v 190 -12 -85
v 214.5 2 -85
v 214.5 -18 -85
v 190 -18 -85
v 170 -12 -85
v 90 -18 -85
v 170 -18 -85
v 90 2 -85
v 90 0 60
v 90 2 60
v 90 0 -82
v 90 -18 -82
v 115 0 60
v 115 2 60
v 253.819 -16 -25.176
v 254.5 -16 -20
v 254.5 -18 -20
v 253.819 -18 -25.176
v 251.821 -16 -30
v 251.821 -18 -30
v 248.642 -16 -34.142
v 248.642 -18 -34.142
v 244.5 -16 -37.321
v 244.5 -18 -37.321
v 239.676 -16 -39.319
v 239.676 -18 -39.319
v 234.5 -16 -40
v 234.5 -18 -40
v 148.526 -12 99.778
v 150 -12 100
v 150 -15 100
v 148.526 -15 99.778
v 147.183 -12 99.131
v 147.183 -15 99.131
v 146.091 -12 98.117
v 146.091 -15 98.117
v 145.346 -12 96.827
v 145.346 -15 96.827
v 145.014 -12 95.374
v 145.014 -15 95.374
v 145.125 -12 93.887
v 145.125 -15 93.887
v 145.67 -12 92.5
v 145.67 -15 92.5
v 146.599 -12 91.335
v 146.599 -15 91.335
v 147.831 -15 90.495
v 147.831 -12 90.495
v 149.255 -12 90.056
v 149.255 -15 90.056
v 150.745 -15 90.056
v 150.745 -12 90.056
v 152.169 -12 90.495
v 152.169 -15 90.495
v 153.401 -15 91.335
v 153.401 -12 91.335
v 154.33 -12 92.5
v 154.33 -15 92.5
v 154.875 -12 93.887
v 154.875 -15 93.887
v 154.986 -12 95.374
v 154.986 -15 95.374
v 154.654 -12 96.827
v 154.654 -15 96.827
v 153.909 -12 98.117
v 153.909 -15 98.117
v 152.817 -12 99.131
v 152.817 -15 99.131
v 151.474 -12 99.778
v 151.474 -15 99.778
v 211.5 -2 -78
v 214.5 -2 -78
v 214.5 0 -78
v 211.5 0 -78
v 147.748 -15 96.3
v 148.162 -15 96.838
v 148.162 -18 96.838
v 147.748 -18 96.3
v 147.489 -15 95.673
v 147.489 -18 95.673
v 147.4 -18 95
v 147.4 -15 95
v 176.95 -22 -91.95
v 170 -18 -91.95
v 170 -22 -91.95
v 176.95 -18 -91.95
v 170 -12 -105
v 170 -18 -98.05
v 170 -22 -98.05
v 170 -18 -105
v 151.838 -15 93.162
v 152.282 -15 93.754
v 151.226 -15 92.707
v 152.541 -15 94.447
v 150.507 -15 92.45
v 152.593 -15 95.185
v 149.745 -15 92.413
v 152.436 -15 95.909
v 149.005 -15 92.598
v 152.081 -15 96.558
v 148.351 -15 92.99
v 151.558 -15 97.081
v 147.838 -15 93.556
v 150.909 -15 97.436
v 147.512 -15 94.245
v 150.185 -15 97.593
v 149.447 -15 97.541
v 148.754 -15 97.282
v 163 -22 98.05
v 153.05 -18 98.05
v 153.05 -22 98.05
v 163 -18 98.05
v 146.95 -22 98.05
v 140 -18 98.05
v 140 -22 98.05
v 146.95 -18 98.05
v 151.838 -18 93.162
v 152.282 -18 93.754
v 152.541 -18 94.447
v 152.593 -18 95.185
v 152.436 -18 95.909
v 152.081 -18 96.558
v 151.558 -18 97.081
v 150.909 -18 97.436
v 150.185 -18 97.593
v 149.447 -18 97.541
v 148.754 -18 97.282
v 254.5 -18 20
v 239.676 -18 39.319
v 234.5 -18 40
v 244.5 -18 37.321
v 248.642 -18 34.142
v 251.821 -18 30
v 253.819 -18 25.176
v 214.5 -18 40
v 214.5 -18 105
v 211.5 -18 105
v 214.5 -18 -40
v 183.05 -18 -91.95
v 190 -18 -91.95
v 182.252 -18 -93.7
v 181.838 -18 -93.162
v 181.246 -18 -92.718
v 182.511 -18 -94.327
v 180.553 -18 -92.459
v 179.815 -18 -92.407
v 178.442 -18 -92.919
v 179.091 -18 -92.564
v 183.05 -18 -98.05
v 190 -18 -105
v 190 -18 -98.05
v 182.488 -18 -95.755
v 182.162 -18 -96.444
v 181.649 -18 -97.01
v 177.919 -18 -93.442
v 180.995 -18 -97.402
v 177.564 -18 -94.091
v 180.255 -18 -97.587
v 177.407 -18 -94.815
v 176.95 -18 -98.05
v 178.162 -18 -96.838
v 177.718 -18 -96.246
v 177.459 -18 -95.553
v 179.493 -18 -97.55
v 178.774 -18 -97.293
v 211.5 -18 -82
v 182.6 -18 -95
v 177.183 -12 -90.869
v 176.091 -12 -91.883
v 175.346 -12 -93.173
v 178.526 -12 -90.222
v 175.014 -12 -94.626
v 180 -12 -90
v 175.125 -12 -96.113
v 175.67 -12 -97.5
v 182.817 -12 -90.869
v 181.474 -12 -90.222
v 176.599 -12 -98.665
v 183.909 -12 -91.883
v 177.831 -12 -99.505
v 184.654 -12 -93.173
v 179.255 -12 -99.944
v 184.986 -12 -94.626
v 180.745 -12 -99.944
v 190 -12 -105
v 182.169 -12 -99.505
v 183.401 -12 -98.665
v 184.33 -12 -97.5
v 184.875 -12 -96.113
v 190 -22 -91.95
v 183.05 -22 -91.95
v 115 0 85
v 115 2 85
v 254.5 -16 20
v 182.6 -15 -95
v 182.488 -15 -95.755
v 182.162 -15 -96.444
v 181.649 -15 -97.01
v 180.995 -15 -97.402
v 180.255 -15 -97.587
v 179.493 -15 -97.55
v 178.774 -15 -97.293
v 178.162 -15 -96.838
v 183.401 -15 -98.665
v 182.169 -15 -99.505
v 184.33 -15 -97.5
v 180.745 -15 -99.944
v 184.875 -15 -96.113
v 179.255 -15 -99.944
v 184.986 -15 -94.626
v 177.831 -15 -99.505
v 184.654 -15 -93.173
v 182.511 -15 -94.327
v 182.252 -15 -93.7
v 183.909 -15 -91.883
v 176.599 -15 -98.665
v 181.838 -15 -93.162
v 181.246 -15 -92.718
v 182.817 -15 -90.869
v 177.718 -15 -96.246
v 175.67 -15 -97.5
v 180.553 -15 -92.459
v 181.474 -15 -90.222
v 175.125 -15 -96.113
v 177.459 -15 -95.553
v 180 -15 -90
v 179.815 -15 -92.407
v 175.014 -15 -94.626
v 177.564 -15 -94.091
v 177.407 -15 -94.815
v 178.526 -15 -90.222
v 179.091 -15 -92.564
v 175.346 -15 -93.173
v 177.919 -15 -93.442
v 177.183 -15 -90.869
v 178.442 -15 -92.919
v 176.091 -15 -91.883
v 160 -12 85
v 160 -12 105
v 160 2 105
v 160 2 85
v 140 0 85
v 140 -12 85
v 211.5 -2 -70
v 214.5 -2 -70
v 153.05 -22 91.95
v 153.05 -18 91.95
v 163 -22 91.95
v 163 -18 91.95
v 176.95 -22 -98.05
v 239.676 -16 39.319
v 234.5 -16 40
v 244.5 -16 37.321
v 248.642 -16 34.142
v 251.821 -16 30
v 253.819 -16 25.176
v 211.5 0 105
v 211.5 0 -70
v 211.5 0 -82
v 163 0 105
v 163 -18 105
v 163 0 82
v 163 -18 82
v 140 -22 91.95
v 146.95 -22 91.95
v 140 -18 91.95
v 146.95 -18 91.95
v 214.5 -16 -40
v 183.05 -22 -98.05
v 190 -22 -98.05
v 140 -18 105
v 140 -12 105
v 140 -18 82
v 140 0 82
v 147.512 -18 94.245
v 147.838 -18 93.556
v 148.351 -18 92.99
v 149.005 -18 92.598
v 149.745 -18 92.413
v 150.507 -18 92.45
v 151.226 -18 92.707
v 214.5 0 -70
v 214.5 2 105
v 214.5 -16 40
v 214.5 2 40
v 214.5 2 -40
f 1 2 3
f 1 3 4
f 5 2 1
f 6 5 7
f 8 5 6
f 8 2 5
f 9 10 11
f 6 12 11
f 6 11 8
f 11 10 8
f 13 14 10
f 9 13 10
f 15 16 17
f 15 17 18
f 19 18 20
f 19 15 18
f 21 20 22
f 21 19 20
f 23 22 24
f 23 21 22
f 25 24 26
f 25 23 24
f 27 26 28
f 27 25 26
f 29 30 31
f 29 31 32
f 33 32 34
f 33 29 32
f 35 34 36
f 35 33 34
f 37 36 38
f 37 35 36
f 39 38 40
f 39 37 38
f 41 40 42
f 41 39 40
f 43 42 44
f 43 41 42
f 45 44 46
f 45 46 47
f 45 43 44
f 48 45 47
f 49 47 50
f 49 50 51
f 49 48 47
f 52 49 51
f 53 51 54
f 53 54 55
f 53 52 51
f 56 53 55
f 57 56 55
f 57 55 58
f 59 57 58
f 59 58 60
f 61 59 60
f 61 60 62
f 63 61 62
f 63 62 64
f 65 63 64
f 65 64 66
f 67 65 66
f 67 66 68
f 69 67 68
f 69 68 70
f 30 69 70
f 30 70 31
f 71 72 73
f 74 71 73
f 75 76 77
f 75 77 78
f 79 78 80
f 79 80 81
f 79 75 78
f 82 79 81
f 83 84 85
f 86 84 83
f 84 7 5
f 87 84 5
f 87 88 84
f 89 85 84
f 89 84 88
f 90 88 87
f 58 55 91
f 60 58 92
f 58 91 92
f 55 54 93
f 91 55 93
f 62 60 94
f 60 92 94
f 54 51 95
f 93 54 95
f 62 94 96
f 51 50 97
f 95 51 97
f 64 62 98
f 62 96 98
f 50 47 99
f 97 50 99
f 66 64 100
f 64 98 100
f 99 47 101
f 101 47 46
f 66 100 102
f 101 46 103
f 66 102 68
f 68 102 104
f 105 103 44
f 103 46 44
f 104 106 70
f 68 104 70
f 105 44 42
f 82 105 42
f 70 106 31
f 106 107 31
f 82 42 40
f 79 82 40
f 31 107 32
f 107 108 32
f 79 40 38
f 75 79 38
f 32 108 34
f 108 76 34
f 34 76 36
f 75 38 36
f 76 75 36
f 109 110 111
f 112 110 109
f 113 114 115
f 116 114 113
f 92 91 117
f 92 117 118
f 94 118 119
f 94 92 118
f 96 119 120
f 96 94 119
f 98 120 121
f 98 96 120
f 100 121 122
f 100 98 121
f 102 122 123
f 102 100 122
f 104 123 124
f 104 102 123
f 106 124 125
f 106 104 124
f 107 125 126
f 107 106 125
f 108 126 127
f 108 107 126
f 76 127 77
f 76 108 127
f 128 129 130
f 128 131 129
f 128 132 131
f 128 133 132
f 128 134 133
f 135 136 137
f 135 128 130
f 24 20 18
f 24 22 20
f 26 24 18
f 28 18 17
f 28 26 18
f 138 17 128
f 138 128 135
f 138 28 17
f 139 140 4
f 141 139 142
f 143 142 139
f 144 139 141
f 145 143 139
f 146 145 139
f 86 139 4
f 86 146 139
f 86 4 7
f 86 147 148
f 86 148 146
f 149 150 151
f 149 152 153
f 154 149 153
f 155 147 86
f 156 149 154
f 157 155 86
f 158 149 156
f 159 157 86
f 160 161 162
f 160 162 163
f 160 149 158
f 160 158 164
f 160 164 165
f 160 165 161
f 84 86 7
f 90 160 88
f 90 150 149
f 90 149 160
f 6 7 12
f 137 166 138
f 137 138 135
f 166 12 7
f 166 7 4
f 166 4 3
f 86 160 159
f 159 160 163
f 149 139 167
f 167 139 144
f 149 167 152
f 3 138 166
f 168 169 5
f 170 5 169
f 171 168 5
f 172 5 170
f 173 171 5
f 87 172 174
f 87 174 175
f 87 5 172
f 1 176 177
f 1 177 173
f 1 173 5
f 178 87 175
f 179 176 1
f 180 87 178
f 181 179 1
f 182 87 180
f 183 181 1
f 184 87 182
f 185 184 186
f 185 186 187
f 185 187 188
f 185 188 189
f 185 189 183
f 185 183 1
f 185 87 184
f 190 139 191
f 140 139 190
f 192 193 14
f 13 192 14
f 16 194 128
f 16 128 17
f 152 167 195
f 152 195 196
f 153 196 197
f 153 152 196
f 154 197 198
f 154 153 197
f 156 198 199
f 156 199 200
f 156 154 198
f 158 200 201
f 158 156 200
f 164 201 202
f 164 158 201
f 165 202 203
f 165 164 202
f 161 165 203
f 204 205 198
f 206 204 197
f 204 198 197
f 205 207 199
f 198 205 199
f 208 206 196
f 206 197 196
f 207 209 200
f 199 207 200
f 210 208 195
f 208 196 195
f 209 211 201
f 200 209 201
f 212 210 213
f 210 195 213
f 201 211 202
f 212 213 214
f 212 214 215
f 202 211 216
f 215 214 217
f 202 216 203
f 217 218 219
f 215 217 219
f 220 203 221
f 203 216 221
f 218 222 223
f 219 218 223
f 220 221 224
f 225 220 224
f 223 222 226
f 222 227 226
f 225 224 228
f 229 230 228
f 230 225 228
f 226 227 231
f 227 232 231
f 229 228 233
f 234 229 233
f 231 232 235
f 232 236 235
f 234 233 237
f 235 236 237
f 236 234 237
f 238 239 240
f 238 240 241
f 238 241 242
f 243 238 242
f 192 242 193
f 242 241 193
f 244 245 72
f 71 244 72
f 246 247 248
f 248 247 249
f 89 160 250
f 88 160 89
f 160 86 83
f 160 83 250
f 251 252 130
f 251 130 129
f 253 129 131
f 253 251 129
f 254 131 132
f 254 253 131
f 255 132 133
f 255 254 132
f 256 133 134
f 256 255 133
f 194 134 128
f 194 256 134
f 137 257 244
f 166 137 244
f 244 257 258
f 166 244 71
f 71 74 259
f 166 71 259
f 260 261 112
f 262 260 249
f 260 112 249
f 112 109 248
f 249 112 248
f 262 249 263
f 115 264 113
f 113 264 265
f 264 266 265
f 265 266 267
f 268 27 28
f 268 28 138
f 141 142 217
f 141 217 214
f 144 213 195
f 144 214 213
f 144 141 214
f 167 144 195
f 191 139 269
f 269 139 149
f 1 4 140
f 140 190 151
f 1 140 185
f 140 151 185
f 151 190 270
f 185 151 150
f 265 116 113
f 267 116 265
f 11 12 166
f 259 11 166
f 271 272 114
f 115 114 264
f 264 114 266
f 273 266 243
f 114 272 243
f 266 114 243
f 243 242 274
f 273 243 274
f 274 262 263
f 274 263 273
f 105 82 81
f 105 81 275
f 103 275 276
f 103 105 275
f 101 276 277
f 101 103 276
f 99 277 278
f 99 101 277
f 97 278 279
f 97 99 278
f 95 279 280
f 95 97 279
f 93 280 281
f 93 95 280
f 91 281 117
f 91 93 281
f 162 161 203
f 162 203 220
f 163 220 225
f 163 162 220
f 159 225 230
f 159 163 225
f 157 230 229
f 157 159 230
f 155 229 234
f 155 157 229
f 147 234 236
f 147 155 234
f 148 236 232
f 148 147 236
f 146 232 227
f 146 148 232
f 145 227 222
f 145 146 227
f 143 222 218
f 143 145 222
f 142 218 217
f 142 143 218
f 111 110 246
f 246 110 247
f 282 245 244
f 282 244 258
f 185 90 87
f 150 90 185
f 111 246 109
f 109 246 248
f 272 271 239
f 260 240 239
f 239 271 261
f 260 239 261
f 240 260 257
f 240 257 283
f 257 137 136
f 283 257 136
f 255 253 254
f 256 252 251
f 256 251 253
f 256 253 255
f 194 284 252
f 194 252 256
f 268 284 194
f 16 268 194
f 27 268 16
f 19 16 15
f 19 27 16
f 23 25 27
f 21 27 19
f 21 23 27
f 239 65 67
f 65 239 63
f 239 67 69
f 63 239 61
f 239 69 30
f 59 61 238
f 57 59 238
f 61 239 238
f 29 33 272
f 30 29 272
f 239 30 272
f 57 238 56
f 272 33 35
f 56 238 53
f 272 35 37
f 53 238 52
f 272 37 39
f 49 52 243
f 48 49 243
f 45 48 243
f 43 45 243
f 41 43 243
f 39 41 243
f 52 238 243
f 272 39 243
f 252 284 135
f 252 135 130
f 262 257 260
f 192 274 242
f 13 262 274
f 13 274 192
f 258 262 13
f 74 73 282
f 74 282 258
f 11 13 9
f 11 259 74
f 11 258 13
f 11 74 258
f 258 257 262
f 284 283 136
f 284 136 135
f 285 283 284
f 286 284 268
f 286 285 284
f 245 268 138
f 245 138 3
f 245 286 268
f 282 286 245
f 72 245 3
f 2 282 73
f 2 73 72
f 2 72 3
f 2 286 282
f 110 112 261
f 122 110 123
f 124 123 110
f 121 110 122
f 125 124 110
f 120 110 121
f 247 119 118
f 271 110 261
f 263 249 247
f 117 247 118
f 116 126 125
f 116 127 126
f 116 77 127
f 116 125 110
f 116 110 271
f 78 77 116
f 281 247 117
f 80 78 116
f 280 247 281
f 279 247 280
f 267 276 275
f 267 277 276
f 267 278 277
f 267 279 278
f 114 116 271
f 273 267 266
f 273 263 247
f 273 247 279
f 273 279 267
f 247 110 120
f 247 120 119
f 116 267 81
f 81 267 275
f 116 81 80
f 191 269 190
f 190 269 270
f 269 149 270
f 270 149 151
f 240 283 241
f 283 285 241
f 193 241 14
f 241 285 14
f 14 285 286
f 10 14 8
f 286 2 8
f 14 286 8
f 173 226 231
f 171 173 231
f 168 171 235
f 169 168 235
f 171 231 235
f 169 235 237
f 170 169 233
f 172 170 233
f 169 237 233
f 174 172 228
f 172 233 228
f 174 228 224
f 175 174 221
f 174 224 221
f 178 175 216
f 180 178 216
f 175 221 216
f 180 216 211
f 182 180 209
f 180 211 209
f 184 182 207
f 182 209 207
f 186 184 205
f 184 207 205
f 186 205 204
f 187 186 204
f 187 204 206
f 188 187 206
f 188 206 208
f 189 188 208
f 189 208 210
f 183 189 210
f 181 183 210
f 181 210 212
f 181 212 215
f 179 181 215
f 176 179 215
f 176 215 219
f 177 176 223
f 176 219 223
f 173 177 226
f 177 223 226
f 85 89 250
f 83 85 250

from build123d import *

# Parameters (mm, degrees)
SKETCH_1_W           = 180
SKETCH_1_H           = 170
EXTRUDE_1_DEPTH      = 2
SKETCH_2_W           = 180
SKETCH_2_H           = 2
SKETCH_2_W_2         = 2
SKETCH_2_H_2         = 166
EXTRUDE_2_DEPTH      = 18
SKETCH_4_W           = 20
SKETCH_4_H           = 20
EXTRUDE_3_DEPTH      = 20
SKETCH_5_W           = 20
SKETCH_5_H           = 20
CUT_EXTRUDE_1_DEPTH  = 14
SKETCH_6_W           = 176
SKETCH_6_H           = 166
SKETCH_6_W_2         = 174
SKETCH_6_H_2         = 164
EXTRUDE_4_DEPTH      = 18
SKETCH_7_W           = 20
SKETCH_7_H           = 20
EXTRUDE_5_DEPTH      = 6
SKETCH_8_W           = 3
SKETCH_8_H           = 164
SKETCH_8_H_2         = 3
CUT_EXTRUDE_2_DEPTH  = 18
SKETCH_9_W           = 77
SKETCH_9_H           = 3
CUT_EXTRUDE_3_DEPTH  = 18
SKETCH_10_W          = 25
SKETCH_10_H          = 25
CUT_EXTRUDE_4_DEPTH  = 18
SKETCH_11_W          = 6.95
SKETCH_11_H          = 6.1
EXTRUDE_6_DEPTH      = 4
CUT_EXTRUDE_5_DEPTH  = 6
CUT_EXTRUDE_START    = -3
SKETCH_13_R          = 5
SKETCH_13_R_2        = 2.6
CUT_EXTRUDE_6_DEPTH  = 3
CUT_EXTRUDE_7_DEPTH  = 3
SKETCH_15_R          = 2.6
CUT_EXTRUDE_8_DEPTH  = 3
SKETCH_16_W          = 6.1
SKETCH_16_H          = 6.95
EXTRUDE_7_DEPTH      = 4
CUT_EXTRUDE_9_DEPTH  = 6
SKETCH_18_R          = 5
SKETCH_18_R_2        = 2.6
CUT_EXTRUDE_10_DEPTH = 3
EXTRUDE_8_DEPTH      = 4
SKETCH_20_W          = 30
SKETCH_20_H          = 20
SKETCH_20_W_2        = 80
EXTRUDE_9_DEPTH      = 2
SKETCH_21_W          = 3
SKETCH_21_H          = 20
EXTRUDE_10_DEPTH     = 18
SKETCH_22_W          = 20
SKETCH_22_H          = 20
SKETCH_22_R          = 5
EXTRUDE_11_DEPTH     = 14
SKETCH_23_W          = 30
SKETCH_23_H          = 20
CUT_EXTRUDE_11_DEPTH = 14
SKETCH_24_W          = 20
SKETCH_24_H          = 20
EXTRUDE_12_DEPTH     = 2
SKETCH_25_W          = 20
SKETCH_25_H          = 3
CUT_EXTRUDE_12_DEPTH = 18
CUT_EXTRUDE_13_DEPTH = 18
SKETCH_27_W          = 3
SKETCH_27_H          = 20
EXTRUDE_13_DEPTH     = 20
SKETCH_28_W          = 23
SKETCH_28_H          = 3
EXTRUDE_14_DEPTH     = 20
SKETCH_29_W          = 3
SKETCH_29_H          = 5
CUT_EXTRUDE_14_DEPTH = 20
SKETCH_30_W          = 20
SKETCH_30_H          = 20
CUT_EXTRUDE_15_DEPTH = 30
SKETCH_31_W          = 3
SKETCH_31_H          = 190
EXTRUDE_15_DEPTH     = 20
EXTRUDE_START        = -2
EXTRUDE_16_DEPTH     = 2
SKETCH_33_W          = 40
SKETCH_33_H          = 80
CUT_EXTRUDE_16_DEPTH = 2
SKETCH_34_W          = 44.5
SKETCH_34_H          = 20
CUT_EXTRUDE_17_DEPTH = 30
SKETCH_35_W          = 20
SKETCH_35_H          = 3
CUT_EXTRUDE_18_DEPTH = 18
EXTRUDE_17_DEPTH     = 20
CUT_EXTRUDE_19_DEPTH = 20
SKETCH_38_R          = 5
CUT_EXTRUDE_20_DEPTH = 17
SKETCH_39_W          = 20
SKETCH_39_H          = 20
CUT_EXTRUDE_21_DEPTH = 14
SKETCH_40_W          = 54.5
SKETCH_40_H          = 20
EXTRUDE_18_DEPTH     = 2
SKETCH_42_W          = 3
SKETCH_42_H          = 23
EXTRUDE_20_DEPTH     = 18
SKETCH_44_W          = 9.95
SKETCH_44_H          = 6.1
SKETCH_44_W_2        = 6.95
EXTRUDE_21_DEPTH     = 4
SKETCH_45_W          = 26.378914519
SKETCH_45_H          = 21.149439528
CUT_EXTRUDE_22_DEPTH = 30
SKETCH_46_W          = 20
SKETCH_46_H          = 3
EXTRUDE_22_DEPTH     = 18
CUT_EXTRUDE_23_DEPTH = 30
SKETCH_48_W          = 47
SKETCH_48_H          = 3
CUT_EXTRUDE_24_DEPTH = 18
SKETCH_49_W          = 50.597895005
SKETCH_49_H          = 84.263639234
CUT_EXTRUDE_25_DEPTH = 2
SKETCH_50_W          = 48.5
SKETCH_50_H          = 3
CUT_EXTRUDE_26_DEPTH = 18
SKETCH_51_W          = 8
SKETCH_51_H          = 2
CUT_EXTRUDE_27_DEPTH = 18


with BuildPart() as part:
    # 草图1 → 凸台-拉伸1 (new body)
    with BuildSketch(Plane(origin=(0, 0, 0), x_dir=(1, 0, 0), z_dir=(0, 1, 0))):
        Rectangle(SKETCH_1_W, SKETCH_1_H)
    extrude_1 = extrude(amount=EXTRUDE_1_DEPTH)

    # 草图2 → 凸台-拉伸2 (add)
    with BuildSketch(Plane(origin=(0, 0, 0), x_dir=(1, 0, 0), z_dir=(0, 1, 0))):
        with Locations((0, 84)):
            Rectangle(SKETCH_2_W, SKETCH_2_H)
        Polygon((-88, 83), (-90, 83), (-90, -85), (-88, -85), (-88, -83), align=None)
        with Locations((89, 0)):
            Rectangle(SKETCH_2_W_2, SKETCH_2_H_2)
        Polygon((90, -85), (90, -83), (88, -83), (-88, -83), (-88, -85), align=None)
    extrude_2 = extrude(amount=-EXTRUDE_2_DEPTH)

    # 草图4 → 凸台-拉伸3 (add)
    with BuildSketch(Plane(origin=(0, 2, 0), x_dir=(1, 0, 0), z_dir=(0, 1, 0))):
        Polygon((10, -85), (0, -85), (-10, -85), (-10, -95), (-10, -105), (10, -105), (10, -95), align=None)
        with Locations((-100, 0)):
            Rectangle(SKETCH_4_W, SKETCH_4_H)
    extrude(amount=-EXTRUDE_3_DEPTH)

    # 草图5 → 切除-拉伸1 (cut)
    with BuildSketch(Plane(origin=(0, 2, 0), x_dir=(1, 0, 0), z_dir=(0, 1, 0))):
        with Locations((-100, 0)):
            Rectangle(SKETCH_5_W, SKETCH_5_H)
        with Locations((0, -95)):
            Rectangle(SKETCH_5_W, SKETCH_5_H)
    extrude(amount=-CUT_EXTRUDE_1_DEPTH, mode=Mode.SUBTRACT)

    # 草图6 → 凸台-拉伸4 (add)
    with BuildSketch(Plane.XZ):
        Rectangle(SKETCH_6_W, SKETCH_6_H)
        Rectangle(SKETCH_6_W_2, SKETCH_6_H_2, mode=Mode.SUBTRACT)
    extrude_4 = extrude(amount=EXTRUDE_4_DEPTH)

    # 草图7 → 凸台-拉伸5 (add)
    with BuildSketch(Plane(origin=(0, -18, 0), x_dir=(-1, 0, 0), z_dir=(0, -1, 0))):
        with Locations((0, 95)):
            Rectangle(SKETCH_7_W, SKETCH_7_H)
    extrude_5 = extrude(amount=-EXTRUDE_5_DEPTH)

    # 草图8 → 切除-拉伸2 (cut)
    with BuildSketch(Plane(origin=(0, -18, 0), x_dir=(-1, 0, 0), z_dir=(0, -1, 0))):
        with Locations((-88.5, 0)):
            Rectangle(SKETCH_8_W, SKETCH_8_H)
        with Locations((-88.5, -83.5)):
            Rectangle(SKETCH_8_W, SKETCH_8_H_2)
    extrude(amount=-CUT_EXTRUDE_2_DEPTH, mode=Mode.SUBTRACT)

    # 草图9 → 切除-拉伸3 (cut)
    with BuildSketch(Plane(origin=(0, -18, 0), x_dir=(-1, 0, 0), z_dir=(0, -1, 0))):
        with Locations((-48.5, -83.5)):
            Rectangle(SKETCH_9_W, SKETCH_9_H)
        with Locations((48.5, -83.5)):
            Rectangle(SKETCH_9_W, SKETCH_9_H)
    extrude(amount=-CUT_EXTRUDE_3_DEPTH, mode=Mode.SUBTRACT)

    # 草图10 → 切除-拉伸4 (cut)
    with BuildSketch(Plane(origin=(0, 2, 0), x_dir=(1, 0, 0), z_dir=(0, 1, 0))):
        with Locations((77.5, -72.5)):
            Rectangle(SKETCH_10_W, SKETCH_10_H)
    cut_extrude_4 = extrude(amount=-CUT_EXTRUDE_4_DEPTH, mode=Mode.SUBTRACT)

    # 草图11 → 凸台-拉伸6 (add)
    with BuildSketch(Plane(origin=(0, -18, 0), x_dir=(-1, 0, 0), z_dir=(0, -1, 0))):
        Polygon((-3.05, 91.95), (-3.05, 98.05), (-10, 98.05), (-10, 95), (-10, 91.95), align=None)
        with Locations((6.525, 95)):
            Rectangle(SKETCH_11_W, SKETCH_11_H)
    extrude_6 = extrude(amount=EXTRUDE_6_DEPTH)

    # 草图12 → 切除-拉伸5 (cut)
    with BuildSketch(Plane(origin=(0, -18, 0), x_dir=(-1, 0, 0), z_dir=(0, -1, 0))):
        with BuildLine():
            ThreePointArc((-1.838477631, 96.838477631), (-1.838477631, 93.161522369), (1.838477631, 93.161522369))
            Line((1.838477631, 93.161522369), (-1.838477631, 96.838477631))
        make_face()
        with BuildLine():
            Line((-1.838477631, 96.838477631), (1.838477631, 93.161522369))
            ThreePointArc((1.838477631, 93.161522369), (2.402086785, 94.005023076), (2.6, 95))
            ThreePointArc((2.6, 95), (0.994976924, 97.402086785), (-1.838477631, 96.838477631))
        make_face()
    cut_extrude_5 = extrude(amount=-CUT_EXTRUDE_5_DEPTH, mode=Mode.SUBTRACT)

    # 草图13 → 切除-拉伸6 (cut)
    with BuildSketch(Plane(origin=(0, -12, 0), x_dir=(1, 0, 0), z_dir=(0, 1, 0)).offset(CUT_EXTRUDE_START)):
        with Locations(Location((0, 95, 0), (0, 0, 270))):
            Circle(SKETCH_13_R)
        with Locations(Location((0, 95, 0), (0, 0, 90))):
            Circle(SKETCH_13_R_2, mode=Mode.SUBTRACT)
    cut_extrude_6 = extrude(amount=CUT_EXTRUDE_6_DEPTH, mode=Mode.SUBTRACT)

    # 草图14 → 切除-拉伸7 (cut)
    with BuildSketch(Plane(origin=(0, -12, 0), x_dir=(1, 0, 0), z_dir=(0, 1, 0))):
        with BuildLine():
            ThreePointArc((-96.464466094, 3.535533906), (-103.535533906, 3.535533906), (-103.535533906, -3.535533906))
            Line((-103.535533906, -3.535533906), (-96.464466094, 3.535533906))
        make_face()
        with BuildLine():
            Line((-96.464466094, 3.535533906), (-103.535533906, -3.535533906))
            ThreePointArc((-103.535533906, -3.535533906), (-98.086582838, -4.619397663), (-95, 0))
            ThreePointArc((-95, 0), (-95.380602337, 1.913417162), (-96.464466094, 3.535533906))
        make_face()
    extrude(amount=-CUT_EXTRUDE_7_DEPTH, mode=Mode.SUBTRACT)

    # 草图15 → 切除-拉伸8 (cut)
    with BuildSketch(Plane(origin=(0, -15, 0), x_dir=(1, 0, 0), z_dir=(0, 1, 0))):
        with Locations(Location((-100, 0, 0), (0, 0, 270))):
            Circle(SKETCH_15_R)
    extrude(amount=-CUT_EXTRUDE_8_DEPTH, mode=Mode.SUBTRACT)

    # 草图16 → 凸台-拉伸7 (add)
    with BuildSketch(Plane.XZ.offset(18)):
        Polygon((-96.95, -3.05), (-100, -3.05), (-103.05, -3.05), (-103.05, -10), (-96.95, -10), align=None)
        with Locations((-100, 6.525)):
            Rectangle(SKETCH_16_W, SKETCH_16_H)
    extrude(amount=EXTRUDE_7_DEPTH)

    # 草图17 → 切除-拉伸9 (cut)
    with BuildSketch(Plane(origin=(0, -18, 0), x_dir=(-1, 0, 0), z_dir=(0, -1, 0))):
        with BuildLine():
            ThreePointArc((2.6, -95), (0.994976924, -92.597913215), (-1.838477631, -93.161522369))
            Line((-1.838477631, -93.161522369), (1.838477631, -96.838477631))
            ThreePointArc((1.838477631, -96.838477631), (2.402086785, -95.994976924), (2.6, -95))
        make_face()
        with BuildLine():
            Line((1.838477631, -96.838477631), (-1.838477631, -93.161522369))
            ThreePointArc((-1.838477631, -93.161522369), (-1.838477631, -96.838477631), (1.838477631, -96.838477631))
        make_face()
    extrude(amount=-CUT_EXTRUDE_9_DEPTH, mode=Mode.SUBTRACT)

    # 草图18 → 切除-拉伸10 (cut)
    with BuildSketch(Plane(origin=(0, -12, 0), x_dir=(1, 0, 0), z_dir=(0, 1, 0)).offset(CUT_EXTRUDE_START)):
        with Locations(Location((0, -95, 0), (0, 0, 270))):
            Circle(SKETCH_18_R)
        with Locations(Location((0, -95, 0), (0, 0, 90))):
            Circle(SKETCH_18_R_2, mode=Mode.SUBTRACT)
    extrude(amount=CUT_EXTRUDE_10_DEPTH, mode=Mode.SUBTRACT)

    # 草图19 → 凸台-拉伸8 (add)
    with BuildSketch(Plane(origin=(0, -18, 0), x_dir=(-1, 0, 0), z_dir=(0, -1, 0))):
        Polygon((3.05, -91.95), (3.05, -95), (3.05, -98.05), (10, -98.05), (10, -91.95), align=None)
        Polygon((-3.05, -98.05), (-3.05, -95), (-3.05, -91.95), (-10, -91.95), (-10, -98.05), align=None)
    extrude(amount=EXTRUDE_8_DEPTH)

    # 草图20 → 凸台-拉伸9 (add)
    with BuildSketch(Plane(origin=(0, 2, 0), x_dir=(1, 0, 0), z_dir=(0, 1, 0))):
        with Locations((25, -95)):
            Rectangle(SKETCH_20_W, SKETCH_20_H)
        with Locations((-50, -95)):
            Rectangle(SKETCH_20_W_2, SKETCH_20_H)
    extrude(amount=-EXTRUDE_9_DEPTH)

    # 草图21 → 凸台-拉伸10 (add)
    with BuildSketch(Plane(origin=(0, 0, 0), x_dir=(-1, 0, 0), z_dir=(0, -1, 0))):
        with Locations((88.5, -95)):
            Rectangle(SKETCH_21_W, SKETCH_21_H)
    extrude(amount=EXTRUDE_10_DEPTH)

    # 草图22 → 凸台-拉伸11 (add)
    with BuildSketch(Plane(origin=(0, -12, 0), x_dir=(1, 0, 0), z_dir=(0, 1, 0))):
        with Locations((0, -95)):
            Rectangle(SKETCH_22_W, SKETCH_22_H)
        with Locations(Location((0, -95, 0), (0, 0, 270))):
            Circle(SKETCH_22_R, mode=Mode.SUBTRACT)
    extrude(amount=EXTRUDE_11_DEPTH)

    # 草图23 → 切除-拉伸11 (cut)
    with BuildSketch(Plane(origin=(0, 0, 0), x_dir=(-1, 0, 0), z_dir=(0, -1, 0))):
        with Locations((-25, -95)):
            Rectangle(SKETCH_23_W, SKETCH_23_H)
    extrude(amount=-CUT_EXTRUDE_11_DEPTH, mode=Mode.SUBTRACT)

    # 草图24 → 凸台-拉伸12 (add)
    with BuildSketch(Plane(origin=(0, 2, 0), x_dir=(1, 0, 0), z_dir=(0, 1, 0))):
        with Locations((80, 95)):
            Rectangle(SKETCH_24_W, SKETCH_24_H)
    extrude(amount=-EXTRUDE_12_DEPTH)

    # 草图25 → 切除-拉伸12 (cut)
    with BuildSketch(Plane(origin=(0, -18, 0), x_dir=(-1, 0, 0), z_dir=(0, -1, 0))):
        with Locations((-80, 83.5)):
            Rectangle(SKETCH_25_W, SKETCH_25_H)
    extrude(amount=-CUT_EXTRUDE_12_DEPTH, mode=Mode.SUBTRACT)

    # 草图26 → 切除-拉伸13 (cut)
    with BuildSketch(Plane.XZ):
        with BuildLine():
            ThreePointArc((90, -88), (83, -95), (90, -102))
            Line((90, -102), (90, -95))
            Line((90, -95), (90, -88))
        make_face()
    extrude(amount=-CUT_EXTRUDE_13_DEPTH, mode=Mode.SUBTRACT)

    # 草图27 → 凸台-拉伸13 (add)
    with BuildSketch(Plane(origin=(0, 2, 0), x_dir=(1, 0, 0), z_dir=(0, 1, 0))):
        with Locations((68.5, 95)):
            Rectangle(SKETCH_27_W, SKETCH_27_H)
    extrude(amount=-EXTRUDE_13_DEPTH)

    # 草图28 → 凸台-拉伸14 (add)
    with BuildSketch(Plane(origin=(0, 2, 0), x_dir=(1, 0, 0), z_dir=(0, 1, 0))):
        with Locations((78.5, 103.5)):
            Rectangle(SKETCH_28_W, SKETCH_28_H)
    extrude(amount=-EXTRUDE_14_DEPTH)

    # 草图29 → 切除-拉伸14 (cut)
    with BuildSketch(Plane(origin=(0, 2, 0), x_dir=(1, 0, 0), z_dir=(0, 1, 0))):
        with Locations((88.5, 102.5)):
            Rectangle(SKETCH_29_W, SKETCH_29_H)
    extrude(amount=-CUT_EXTRUDE_14_DEPTH, mode=Mode.SUBTRACT)

    # 草图30 → 切除-拉伸15 (cut)
    with BuildSketch(Plane(origin=(0, 2, 0), x_dir=(1, 0, 0), z_dir=(0, 1, 0))):
        with BuildLine():
            Line((-34.5, 40), (-34.5, 85))
            Line((-34.5, 85), (-90, 85))
            Line((-90, 85), (-90, 10))
            Line((-90, 10), (-90, -10))
            Line((-90, -10), (-90, -105))
            Line((-90, -105), (-34.5, -105))
            Line((-34.5, -105), (-34.5, -85))
            Line((-34.5, -85), (-34.5, -40))
            Line((-34.5, -40), (-54.5, -40))
            ThreePointArc((-54.5, -40), (-68.642135624, -34.142135624), (-74.5, -20))
            Line((-74.5, -20), (-74.5, 20))
            ThreePointArc((-74.5, 20), (-68.642135624, 34.142135624), (-54.5, 40))
            Line((-54.5, 40), (-34.5, 40))
        make_face()
        with Locations((-100, 0)):
            Rectangle(SKETCH_30_W, SKETCH_30_H)
    cut_extrude_15 = extrude(amount=-CUT_EXTRUDE_15_DEPTH, mode=Mode.SUBTRACT)

    # 草图31 → 凸台-拉伸15 (add)
    with BuildSketch(Plane(origin=(0, 2, 0), x_dir=(1, 0, 0), z_dir=(0, 1, 0))):
        with Locations((-33, -10)):
            Rectangle(SKETCH_31_W, SKETCH_31_H)
    extrude_15 = extrude(amount=-EXTRUDE_15_DEPTH)

    # 草图32 → 凸台-拉伸16 (add)
    with BuildSketch(Plane(origin=(0, -18, 0), x_dir=(-1, 0, 0), z_dir=(0, -1, 0)).offset(EXTRUDE_START)):
        with BuildLine():
            Line((34.5, -40), (54.5, -40))
            ThreePointArc((54.5, -40), (68.642135624, -34.142135624), (74.5, -20))
            Line((74.5, -20), (74.5, 20))
            ThreePointArc((74.5, 20), (68.642135624, 34.142135624), (54.5, 40))
            Line((54.5, 40), (34.5, 40))
            Line((34.5, 40), (34.5, -40))
        make_face()
    extrude_16 = extrude(amount=EXTRUDE_16_DEPTH)

    # 草图33 → 切除-拉伸16 (cut)
    with BuildSketch(Plane(origin=(0, 2, 0), x_dir=(1, 0, 0), z_dir=(0, 1, 0))):
        with Locations((-54.5, 0)):
            Rectangle(SKETCH_33_W, SKETCH_33_H)
    extrude(amount=-CUT_EXTRUDE_16_DEPTH, mode=Mode.SUBTRACT)

    # 草图34 → 切除-拉伸17 (cut)
    with BuildSketch(Plane(origin=(0, 2, 0), x_dir=(1, 0, 0), z_dir=(0, 1, 0))):
        with Locations((-12.25, -95)):
            Rectangle(SKETCH_34_W, SKETCH_34_H)
    extrude(amount=-CUT_EXTRUDE_17_DEPTH, mode=Mode.SUBTRACT)

    # 草图35 → 切除-拉伸18 (cut)
    with BuildSketch(Plane(origin=(0, -18, 0), x_dir=(-1, 0, 0), z_dir=(0, -1, 0))):
        with Locations((0, -83.5)):
            Rectangle(SKETCH_35_W, SKETCH_35_H)
    extrude(amount=-CUT_EXTRUDE_18_DEPTH, mode=Mode.SUBTRACT)

    # 草图36 → 凸台-拉伸17 (add)
    with BuildSketch(Plane(origin=(0, 2, 0), x_dir=(1, 0, 0), z_dir=(0, 1, 0))):
        Polygon((40, -105), (40, -85), (40, -82), (20, -82), (20, -85), (20, -105), align=None)
    extrude_17 = extrude(amount=-EXTRUDE_17_DEPTH)

    # 草图37 → 切除-拉伸19 (cut)
    with BuildSketch(Plane(origin=(0, 2, 0), x_dir=(1, 0, 0), z_dir=(0, 1, 0))):
        with BuildLine():
            ThreePointArc((32.6, -95), (30.994976924, -92.597913215), (28.161522369, -93.161522369))
            Line((28.161522369, -93.161522369), (31.838477631, -96.838477631))
            ThreePointArc((31.838477631, -96.838477631), (32.402086785, -95.994976924), (32.6, -95))
        make_face()
        with BuildLine():
            Line((31.838477631, -96.838477631), (28.161522369, -93.161522369))
            ThreePointArc((28.161522369, -93.161522369), (28.161522369, -96.838477631), (31.838477631, -96.838477631))
        make_face()
    cut_extrude_19 = extrude(amount=-CUT_EXTRUDE_19_DEPTH, mode=Mode.SUBTRACT)

    # 草图38 → 切除-拉伸20 (cut)
    with BuildSketch(Plane(origin=(0, 2, 0), x_dir=(1, 0, 0), z_dir=(0, 1, 0))):
        with Locations(Location((30, -95, 0), (0, 0, 270))):
            Circle(SKETCH_38_R)
    cut_extrude_20 = extrude(amount=-CUT_EXTRUDE_20_DEPTH, mode=Mode.SUBTRACT)

    # 草图39 → 切除-拉伸21 (cut)
    with BuildSketch(Plane(origin=(0, 2, 0), x_dir=(1, 0, 0), z_dir=(0, 1, 0))):
        with Locations((30, -95)):
            Rectangle(SKETCH_39_W, SKETCH_39_H)
    cut_extrude_21 = extrude(amount=-CUT_EXTRUDE_21_DEPTH, mode=Mode.SUBTRACT)

    # 草图40 → 凸台-拉伸18 (add)
    with BuildSketch(Plane(origin=(0, 2, 0), x_dir=(1, 0, 0), z_dir=(0, 1, 0))):
        with Locations((-7.25, -95)):
            Rectangle(SKETCH_40_W, SKETCH_40_H)
    extrude_18 = extrude(amount=-EXTRUDE_18_DEPTH)

    # 草图42 → 凸台-拉伸20 (add)
    with BuildSketch(Plane(origin=(0, -18, 0), x_dir=(-1, 0, 0), z_dir=(0, -1, 0))):
        with Locations((-18.5, -93.5)):
            Rectangle(SKETCH_42_W, SKETCH_42_H)
    extrude_20 = extrude(amount=-EXTRUDE_20_DEPTH)

    # 草图44 → 凸台-拉伸21 (add)
    with BuildSketch(Plane(origin=(0, -18, 0), x_dir=(-1, 0, 0), z_dir=(0, -1, 0))):
        with Locations((-21.975, -95)):
            Rectangle(SKETCH_44_W, SKETCH_44_H)
        with Locations((-36.525, -95)):
            Rectangle(SKETCH_44_W_2, SKETCH_44_H)
    extrude_21 = extrude(amount=EXTRUDE_21_DEPTH)

    # 草图45 → 切除-拉伸22 (cut)
    with BuildSketch(Plane(origin=(0, 2, 0), x_dir=(1, 0, 0), z_dir=(0, 1, 0))):
        with Locations((80.18945726, 95.574719764)):
            Rectangle(SKETCH_45_W, SKETCH_45_H)
    extrude(amount=-CUT_EXTRUDE_22_DEPTH, mode=Mode.SUBTRACT)

    # 草图46 → 凸台-拉伸22 (add)
    with BuildSketch(Plane(origin=(0, 0, 0), x_dir=(-1, 0, 0), z_dir=(0, -1, 0))):
        with Locations((-80, 83.5)):
            Rectangle(SKETCH_46_W, SKETCH_46_H)
    extrude(amount=EXTRUDE_22_DEPTH)

    # 镜向1: 凸台-拉伸1, 凸台-拉伸2, 凸台-拉伸4, 凸台-拉伸5, 切除-拉伸4, 凸台-拉伸6, 切除-拉伸5, 切除-拉伸6, 切除-拉伸15, 凸台-拉伸15, 凸台-拉伸16, 凸台-拉伸17, 切除-拉伸19, 切除-拉伸20, 切除-拉伸21, 凸台-拉伸18, 凸台-拉伸20, 凸台-拉伸21 across plane
    add(extrude_1.mirror(Plane(origin=(90, 2, 85), x_dir=(0, 0, 1), z_dir=(-1, 0, 0))))
    add(extrude_2.mirror(Plane(origin=(90, 2, 85), x_dir=(0, 0, 1), z_dir=(-1, 0, 0))))
    add(extrude_4.mirror(Plane(origin=(90, 2, 85), x_dir=(0, 0, 1), z_dir=(-1, 0, 0))))
    add(extrude_5.mirror(Plane(origin=(90, 2, 85), x_dir=(0, 0, 1), z_dir=(-1, 0, 0))))
    add(cut_extrude_4.mirror(Plane(origin=(90, 2, 85), x_dir=(0, 0, 1), z_dir=(-1, 0, 0))), mode=Mode.SUBTRACT)
    add(extrude_6.mirror(Plane(origin=(90, 2, 85), x_dir=(0, 0, 1), z_dir=(-1, 0, 0))))
    add(cut_extrude_5.mirror(Plane(origin=(90, 2, 85), x_dir=(0, 0, 1), z_dir=(-1, 0, 0))), mode=Mode.SUBTRACT)
    add(cut_extrude_6.mirror(Plane(origin=(90, 2, 85), x_dir=(0, 0, 1), z_dir=(-1, 0, 0))), mode=Mode.SUBTRACT)
    add(cut_extrude_15.mirror(Plane(origin=(90, 2, 85), x_dir=(0, 0, 1), z_dir=(-1, 0, 0))), mode=Mode.SUBTRACT)
    add(extrude_15.mirror(Plane(origin=(90, 2, 85), x_dir=(0, 0, 1), z_dir=(-1, 0, 0))))
    add(extrude_16.mirror(Plane(origin=(90, 2, 85), x_dir=(0, 0, 1), z_dir=(-1, 0, 0))))
    add(extrude_17.mirror(Plane(origin=(90, 2, 85), x_dir=(0, 0, 1), z_dir=(-1, 0, 0))))
    add(cut_extrude_19.mirror(Plane(origin=(90, 2, 85), x_dir=(0, 0, 1), z_dir=(-1, 0, 0))), mode=Mode.SUBTRACT)
    add(cut_extrude_20.mirror(Plane(origin=(90, 2, 85), x_dir=(0, 0, 1), z_dir=(-1, 0, 0))), mode=Mode.SUBTRACT)
    add(cut_extrude_21.mirror(Plane(origin=(90, 2, 85), x_dir=(0, 0, 1), z_dir=(-1, 0, 0))), mode=Mode.SUBTRACT)
    add(extrude_18.mirror(Plane(origin=(90, 2, 85), x_dir=(0, 0, 1), z_dir=(-1, 0, 0))))
    add(extrude_20.mirror(Plane(origin=(90, 2, 85), x_dir=(0, 0, 1), z_dir=(-1, 0, 0))))
    add(extrude_21.mirror(Plane(origin=(90, 2, 85), x_dir=(0, 0, 1), z_dir=(-1, 0, 0))))

    # 草图47 → 切除-拉伸23 (cut)
    with BuildSketch(Plane(origin=(0, 2, 0), x_dir=(1, 0, 0), z_dir=(0, 1, 0))):
        Polygon((-85.012299468, 85), (-34.5, 85), (90, 85), (90, 116.288781381), (-85.012299468, 116.288781381), align=None)
        Polygon((90, 85), (-34.5, 85), (-34.5, -105), (20, -105), (20, -85), (65, -85), (65, -60), (90, -60), align=None)
        Polygon((-34.5, -105), (-34.5, 85), (-85.012299468, 85), (-85.012299468, -142.465339739), (90, -142.465339739), (90, -60), (65, -60), (65, -85), (20, -85), (20, -105), align=None)
    extrude(amount=-CUT_EXTRUDE_23_DEPTH, mode=Mode.SUBTRACT)

    # 草图48 → 切除-拉伸24 (cut)
    with BuildSketch(Plane.XZ.offset(18)):
        Polygon((90, -82), (93, -82), (93, 82), (93, 85), (90, 85), align=None)
        with Locations((116.5, 83.5)):
            Rectangle(SKETCH_48_W, SKETCH_48_H)
    extrude(amount=-CUT_EXTRUDE_24_DEPTH, mode=Mode.SUBTRACT)

    # 草图49 → 切除-拉伸25 (cut)
    with BuildSketch(Plane(origin=(0, 2, 0), x_dir=(1, 0, 0), z_dir=(0, 1, 0))):
        with Locations((239.798947502, 2.131819617)):
            Rectangle(SKETCH_49_W, SKETCH_49_H)
    extrude(amount=-CUT_EXTRUDE_25_DEPTH, mode=Mode.SUBTRACT)

    # 草图50 → 切除-拉伸26 (cut)
    with BuildSketch(Plane(origin=(0, -18, 0), x_dir=(-1, 0, 0), z_dir=(0, -1, 0))):
        with Locations((-187.25, -83.5)):
            Rectangle(SKETCH_50_W, SKETCH_50_H)
    extrude(amount=-CUT_EXTRUDE_26_DEPTH, mode=Mode.SUBTRACT)

    # 草图51 → 切除-拉伸27 (cut)
    with BuildSketch(Plane(origin=(214.5, 0, 0), x_dir=(0, 0, -1), z_dir=(1, 0, 0))):
        with Locations((74, -1)):
            Rectangle(SKETCH_51_W, SKETCH_51_H)
    extrude(amount=-CUT_EXTRUDE_27_DEPTH, mode=Mode.SUBTRACT)


solid = part.part
